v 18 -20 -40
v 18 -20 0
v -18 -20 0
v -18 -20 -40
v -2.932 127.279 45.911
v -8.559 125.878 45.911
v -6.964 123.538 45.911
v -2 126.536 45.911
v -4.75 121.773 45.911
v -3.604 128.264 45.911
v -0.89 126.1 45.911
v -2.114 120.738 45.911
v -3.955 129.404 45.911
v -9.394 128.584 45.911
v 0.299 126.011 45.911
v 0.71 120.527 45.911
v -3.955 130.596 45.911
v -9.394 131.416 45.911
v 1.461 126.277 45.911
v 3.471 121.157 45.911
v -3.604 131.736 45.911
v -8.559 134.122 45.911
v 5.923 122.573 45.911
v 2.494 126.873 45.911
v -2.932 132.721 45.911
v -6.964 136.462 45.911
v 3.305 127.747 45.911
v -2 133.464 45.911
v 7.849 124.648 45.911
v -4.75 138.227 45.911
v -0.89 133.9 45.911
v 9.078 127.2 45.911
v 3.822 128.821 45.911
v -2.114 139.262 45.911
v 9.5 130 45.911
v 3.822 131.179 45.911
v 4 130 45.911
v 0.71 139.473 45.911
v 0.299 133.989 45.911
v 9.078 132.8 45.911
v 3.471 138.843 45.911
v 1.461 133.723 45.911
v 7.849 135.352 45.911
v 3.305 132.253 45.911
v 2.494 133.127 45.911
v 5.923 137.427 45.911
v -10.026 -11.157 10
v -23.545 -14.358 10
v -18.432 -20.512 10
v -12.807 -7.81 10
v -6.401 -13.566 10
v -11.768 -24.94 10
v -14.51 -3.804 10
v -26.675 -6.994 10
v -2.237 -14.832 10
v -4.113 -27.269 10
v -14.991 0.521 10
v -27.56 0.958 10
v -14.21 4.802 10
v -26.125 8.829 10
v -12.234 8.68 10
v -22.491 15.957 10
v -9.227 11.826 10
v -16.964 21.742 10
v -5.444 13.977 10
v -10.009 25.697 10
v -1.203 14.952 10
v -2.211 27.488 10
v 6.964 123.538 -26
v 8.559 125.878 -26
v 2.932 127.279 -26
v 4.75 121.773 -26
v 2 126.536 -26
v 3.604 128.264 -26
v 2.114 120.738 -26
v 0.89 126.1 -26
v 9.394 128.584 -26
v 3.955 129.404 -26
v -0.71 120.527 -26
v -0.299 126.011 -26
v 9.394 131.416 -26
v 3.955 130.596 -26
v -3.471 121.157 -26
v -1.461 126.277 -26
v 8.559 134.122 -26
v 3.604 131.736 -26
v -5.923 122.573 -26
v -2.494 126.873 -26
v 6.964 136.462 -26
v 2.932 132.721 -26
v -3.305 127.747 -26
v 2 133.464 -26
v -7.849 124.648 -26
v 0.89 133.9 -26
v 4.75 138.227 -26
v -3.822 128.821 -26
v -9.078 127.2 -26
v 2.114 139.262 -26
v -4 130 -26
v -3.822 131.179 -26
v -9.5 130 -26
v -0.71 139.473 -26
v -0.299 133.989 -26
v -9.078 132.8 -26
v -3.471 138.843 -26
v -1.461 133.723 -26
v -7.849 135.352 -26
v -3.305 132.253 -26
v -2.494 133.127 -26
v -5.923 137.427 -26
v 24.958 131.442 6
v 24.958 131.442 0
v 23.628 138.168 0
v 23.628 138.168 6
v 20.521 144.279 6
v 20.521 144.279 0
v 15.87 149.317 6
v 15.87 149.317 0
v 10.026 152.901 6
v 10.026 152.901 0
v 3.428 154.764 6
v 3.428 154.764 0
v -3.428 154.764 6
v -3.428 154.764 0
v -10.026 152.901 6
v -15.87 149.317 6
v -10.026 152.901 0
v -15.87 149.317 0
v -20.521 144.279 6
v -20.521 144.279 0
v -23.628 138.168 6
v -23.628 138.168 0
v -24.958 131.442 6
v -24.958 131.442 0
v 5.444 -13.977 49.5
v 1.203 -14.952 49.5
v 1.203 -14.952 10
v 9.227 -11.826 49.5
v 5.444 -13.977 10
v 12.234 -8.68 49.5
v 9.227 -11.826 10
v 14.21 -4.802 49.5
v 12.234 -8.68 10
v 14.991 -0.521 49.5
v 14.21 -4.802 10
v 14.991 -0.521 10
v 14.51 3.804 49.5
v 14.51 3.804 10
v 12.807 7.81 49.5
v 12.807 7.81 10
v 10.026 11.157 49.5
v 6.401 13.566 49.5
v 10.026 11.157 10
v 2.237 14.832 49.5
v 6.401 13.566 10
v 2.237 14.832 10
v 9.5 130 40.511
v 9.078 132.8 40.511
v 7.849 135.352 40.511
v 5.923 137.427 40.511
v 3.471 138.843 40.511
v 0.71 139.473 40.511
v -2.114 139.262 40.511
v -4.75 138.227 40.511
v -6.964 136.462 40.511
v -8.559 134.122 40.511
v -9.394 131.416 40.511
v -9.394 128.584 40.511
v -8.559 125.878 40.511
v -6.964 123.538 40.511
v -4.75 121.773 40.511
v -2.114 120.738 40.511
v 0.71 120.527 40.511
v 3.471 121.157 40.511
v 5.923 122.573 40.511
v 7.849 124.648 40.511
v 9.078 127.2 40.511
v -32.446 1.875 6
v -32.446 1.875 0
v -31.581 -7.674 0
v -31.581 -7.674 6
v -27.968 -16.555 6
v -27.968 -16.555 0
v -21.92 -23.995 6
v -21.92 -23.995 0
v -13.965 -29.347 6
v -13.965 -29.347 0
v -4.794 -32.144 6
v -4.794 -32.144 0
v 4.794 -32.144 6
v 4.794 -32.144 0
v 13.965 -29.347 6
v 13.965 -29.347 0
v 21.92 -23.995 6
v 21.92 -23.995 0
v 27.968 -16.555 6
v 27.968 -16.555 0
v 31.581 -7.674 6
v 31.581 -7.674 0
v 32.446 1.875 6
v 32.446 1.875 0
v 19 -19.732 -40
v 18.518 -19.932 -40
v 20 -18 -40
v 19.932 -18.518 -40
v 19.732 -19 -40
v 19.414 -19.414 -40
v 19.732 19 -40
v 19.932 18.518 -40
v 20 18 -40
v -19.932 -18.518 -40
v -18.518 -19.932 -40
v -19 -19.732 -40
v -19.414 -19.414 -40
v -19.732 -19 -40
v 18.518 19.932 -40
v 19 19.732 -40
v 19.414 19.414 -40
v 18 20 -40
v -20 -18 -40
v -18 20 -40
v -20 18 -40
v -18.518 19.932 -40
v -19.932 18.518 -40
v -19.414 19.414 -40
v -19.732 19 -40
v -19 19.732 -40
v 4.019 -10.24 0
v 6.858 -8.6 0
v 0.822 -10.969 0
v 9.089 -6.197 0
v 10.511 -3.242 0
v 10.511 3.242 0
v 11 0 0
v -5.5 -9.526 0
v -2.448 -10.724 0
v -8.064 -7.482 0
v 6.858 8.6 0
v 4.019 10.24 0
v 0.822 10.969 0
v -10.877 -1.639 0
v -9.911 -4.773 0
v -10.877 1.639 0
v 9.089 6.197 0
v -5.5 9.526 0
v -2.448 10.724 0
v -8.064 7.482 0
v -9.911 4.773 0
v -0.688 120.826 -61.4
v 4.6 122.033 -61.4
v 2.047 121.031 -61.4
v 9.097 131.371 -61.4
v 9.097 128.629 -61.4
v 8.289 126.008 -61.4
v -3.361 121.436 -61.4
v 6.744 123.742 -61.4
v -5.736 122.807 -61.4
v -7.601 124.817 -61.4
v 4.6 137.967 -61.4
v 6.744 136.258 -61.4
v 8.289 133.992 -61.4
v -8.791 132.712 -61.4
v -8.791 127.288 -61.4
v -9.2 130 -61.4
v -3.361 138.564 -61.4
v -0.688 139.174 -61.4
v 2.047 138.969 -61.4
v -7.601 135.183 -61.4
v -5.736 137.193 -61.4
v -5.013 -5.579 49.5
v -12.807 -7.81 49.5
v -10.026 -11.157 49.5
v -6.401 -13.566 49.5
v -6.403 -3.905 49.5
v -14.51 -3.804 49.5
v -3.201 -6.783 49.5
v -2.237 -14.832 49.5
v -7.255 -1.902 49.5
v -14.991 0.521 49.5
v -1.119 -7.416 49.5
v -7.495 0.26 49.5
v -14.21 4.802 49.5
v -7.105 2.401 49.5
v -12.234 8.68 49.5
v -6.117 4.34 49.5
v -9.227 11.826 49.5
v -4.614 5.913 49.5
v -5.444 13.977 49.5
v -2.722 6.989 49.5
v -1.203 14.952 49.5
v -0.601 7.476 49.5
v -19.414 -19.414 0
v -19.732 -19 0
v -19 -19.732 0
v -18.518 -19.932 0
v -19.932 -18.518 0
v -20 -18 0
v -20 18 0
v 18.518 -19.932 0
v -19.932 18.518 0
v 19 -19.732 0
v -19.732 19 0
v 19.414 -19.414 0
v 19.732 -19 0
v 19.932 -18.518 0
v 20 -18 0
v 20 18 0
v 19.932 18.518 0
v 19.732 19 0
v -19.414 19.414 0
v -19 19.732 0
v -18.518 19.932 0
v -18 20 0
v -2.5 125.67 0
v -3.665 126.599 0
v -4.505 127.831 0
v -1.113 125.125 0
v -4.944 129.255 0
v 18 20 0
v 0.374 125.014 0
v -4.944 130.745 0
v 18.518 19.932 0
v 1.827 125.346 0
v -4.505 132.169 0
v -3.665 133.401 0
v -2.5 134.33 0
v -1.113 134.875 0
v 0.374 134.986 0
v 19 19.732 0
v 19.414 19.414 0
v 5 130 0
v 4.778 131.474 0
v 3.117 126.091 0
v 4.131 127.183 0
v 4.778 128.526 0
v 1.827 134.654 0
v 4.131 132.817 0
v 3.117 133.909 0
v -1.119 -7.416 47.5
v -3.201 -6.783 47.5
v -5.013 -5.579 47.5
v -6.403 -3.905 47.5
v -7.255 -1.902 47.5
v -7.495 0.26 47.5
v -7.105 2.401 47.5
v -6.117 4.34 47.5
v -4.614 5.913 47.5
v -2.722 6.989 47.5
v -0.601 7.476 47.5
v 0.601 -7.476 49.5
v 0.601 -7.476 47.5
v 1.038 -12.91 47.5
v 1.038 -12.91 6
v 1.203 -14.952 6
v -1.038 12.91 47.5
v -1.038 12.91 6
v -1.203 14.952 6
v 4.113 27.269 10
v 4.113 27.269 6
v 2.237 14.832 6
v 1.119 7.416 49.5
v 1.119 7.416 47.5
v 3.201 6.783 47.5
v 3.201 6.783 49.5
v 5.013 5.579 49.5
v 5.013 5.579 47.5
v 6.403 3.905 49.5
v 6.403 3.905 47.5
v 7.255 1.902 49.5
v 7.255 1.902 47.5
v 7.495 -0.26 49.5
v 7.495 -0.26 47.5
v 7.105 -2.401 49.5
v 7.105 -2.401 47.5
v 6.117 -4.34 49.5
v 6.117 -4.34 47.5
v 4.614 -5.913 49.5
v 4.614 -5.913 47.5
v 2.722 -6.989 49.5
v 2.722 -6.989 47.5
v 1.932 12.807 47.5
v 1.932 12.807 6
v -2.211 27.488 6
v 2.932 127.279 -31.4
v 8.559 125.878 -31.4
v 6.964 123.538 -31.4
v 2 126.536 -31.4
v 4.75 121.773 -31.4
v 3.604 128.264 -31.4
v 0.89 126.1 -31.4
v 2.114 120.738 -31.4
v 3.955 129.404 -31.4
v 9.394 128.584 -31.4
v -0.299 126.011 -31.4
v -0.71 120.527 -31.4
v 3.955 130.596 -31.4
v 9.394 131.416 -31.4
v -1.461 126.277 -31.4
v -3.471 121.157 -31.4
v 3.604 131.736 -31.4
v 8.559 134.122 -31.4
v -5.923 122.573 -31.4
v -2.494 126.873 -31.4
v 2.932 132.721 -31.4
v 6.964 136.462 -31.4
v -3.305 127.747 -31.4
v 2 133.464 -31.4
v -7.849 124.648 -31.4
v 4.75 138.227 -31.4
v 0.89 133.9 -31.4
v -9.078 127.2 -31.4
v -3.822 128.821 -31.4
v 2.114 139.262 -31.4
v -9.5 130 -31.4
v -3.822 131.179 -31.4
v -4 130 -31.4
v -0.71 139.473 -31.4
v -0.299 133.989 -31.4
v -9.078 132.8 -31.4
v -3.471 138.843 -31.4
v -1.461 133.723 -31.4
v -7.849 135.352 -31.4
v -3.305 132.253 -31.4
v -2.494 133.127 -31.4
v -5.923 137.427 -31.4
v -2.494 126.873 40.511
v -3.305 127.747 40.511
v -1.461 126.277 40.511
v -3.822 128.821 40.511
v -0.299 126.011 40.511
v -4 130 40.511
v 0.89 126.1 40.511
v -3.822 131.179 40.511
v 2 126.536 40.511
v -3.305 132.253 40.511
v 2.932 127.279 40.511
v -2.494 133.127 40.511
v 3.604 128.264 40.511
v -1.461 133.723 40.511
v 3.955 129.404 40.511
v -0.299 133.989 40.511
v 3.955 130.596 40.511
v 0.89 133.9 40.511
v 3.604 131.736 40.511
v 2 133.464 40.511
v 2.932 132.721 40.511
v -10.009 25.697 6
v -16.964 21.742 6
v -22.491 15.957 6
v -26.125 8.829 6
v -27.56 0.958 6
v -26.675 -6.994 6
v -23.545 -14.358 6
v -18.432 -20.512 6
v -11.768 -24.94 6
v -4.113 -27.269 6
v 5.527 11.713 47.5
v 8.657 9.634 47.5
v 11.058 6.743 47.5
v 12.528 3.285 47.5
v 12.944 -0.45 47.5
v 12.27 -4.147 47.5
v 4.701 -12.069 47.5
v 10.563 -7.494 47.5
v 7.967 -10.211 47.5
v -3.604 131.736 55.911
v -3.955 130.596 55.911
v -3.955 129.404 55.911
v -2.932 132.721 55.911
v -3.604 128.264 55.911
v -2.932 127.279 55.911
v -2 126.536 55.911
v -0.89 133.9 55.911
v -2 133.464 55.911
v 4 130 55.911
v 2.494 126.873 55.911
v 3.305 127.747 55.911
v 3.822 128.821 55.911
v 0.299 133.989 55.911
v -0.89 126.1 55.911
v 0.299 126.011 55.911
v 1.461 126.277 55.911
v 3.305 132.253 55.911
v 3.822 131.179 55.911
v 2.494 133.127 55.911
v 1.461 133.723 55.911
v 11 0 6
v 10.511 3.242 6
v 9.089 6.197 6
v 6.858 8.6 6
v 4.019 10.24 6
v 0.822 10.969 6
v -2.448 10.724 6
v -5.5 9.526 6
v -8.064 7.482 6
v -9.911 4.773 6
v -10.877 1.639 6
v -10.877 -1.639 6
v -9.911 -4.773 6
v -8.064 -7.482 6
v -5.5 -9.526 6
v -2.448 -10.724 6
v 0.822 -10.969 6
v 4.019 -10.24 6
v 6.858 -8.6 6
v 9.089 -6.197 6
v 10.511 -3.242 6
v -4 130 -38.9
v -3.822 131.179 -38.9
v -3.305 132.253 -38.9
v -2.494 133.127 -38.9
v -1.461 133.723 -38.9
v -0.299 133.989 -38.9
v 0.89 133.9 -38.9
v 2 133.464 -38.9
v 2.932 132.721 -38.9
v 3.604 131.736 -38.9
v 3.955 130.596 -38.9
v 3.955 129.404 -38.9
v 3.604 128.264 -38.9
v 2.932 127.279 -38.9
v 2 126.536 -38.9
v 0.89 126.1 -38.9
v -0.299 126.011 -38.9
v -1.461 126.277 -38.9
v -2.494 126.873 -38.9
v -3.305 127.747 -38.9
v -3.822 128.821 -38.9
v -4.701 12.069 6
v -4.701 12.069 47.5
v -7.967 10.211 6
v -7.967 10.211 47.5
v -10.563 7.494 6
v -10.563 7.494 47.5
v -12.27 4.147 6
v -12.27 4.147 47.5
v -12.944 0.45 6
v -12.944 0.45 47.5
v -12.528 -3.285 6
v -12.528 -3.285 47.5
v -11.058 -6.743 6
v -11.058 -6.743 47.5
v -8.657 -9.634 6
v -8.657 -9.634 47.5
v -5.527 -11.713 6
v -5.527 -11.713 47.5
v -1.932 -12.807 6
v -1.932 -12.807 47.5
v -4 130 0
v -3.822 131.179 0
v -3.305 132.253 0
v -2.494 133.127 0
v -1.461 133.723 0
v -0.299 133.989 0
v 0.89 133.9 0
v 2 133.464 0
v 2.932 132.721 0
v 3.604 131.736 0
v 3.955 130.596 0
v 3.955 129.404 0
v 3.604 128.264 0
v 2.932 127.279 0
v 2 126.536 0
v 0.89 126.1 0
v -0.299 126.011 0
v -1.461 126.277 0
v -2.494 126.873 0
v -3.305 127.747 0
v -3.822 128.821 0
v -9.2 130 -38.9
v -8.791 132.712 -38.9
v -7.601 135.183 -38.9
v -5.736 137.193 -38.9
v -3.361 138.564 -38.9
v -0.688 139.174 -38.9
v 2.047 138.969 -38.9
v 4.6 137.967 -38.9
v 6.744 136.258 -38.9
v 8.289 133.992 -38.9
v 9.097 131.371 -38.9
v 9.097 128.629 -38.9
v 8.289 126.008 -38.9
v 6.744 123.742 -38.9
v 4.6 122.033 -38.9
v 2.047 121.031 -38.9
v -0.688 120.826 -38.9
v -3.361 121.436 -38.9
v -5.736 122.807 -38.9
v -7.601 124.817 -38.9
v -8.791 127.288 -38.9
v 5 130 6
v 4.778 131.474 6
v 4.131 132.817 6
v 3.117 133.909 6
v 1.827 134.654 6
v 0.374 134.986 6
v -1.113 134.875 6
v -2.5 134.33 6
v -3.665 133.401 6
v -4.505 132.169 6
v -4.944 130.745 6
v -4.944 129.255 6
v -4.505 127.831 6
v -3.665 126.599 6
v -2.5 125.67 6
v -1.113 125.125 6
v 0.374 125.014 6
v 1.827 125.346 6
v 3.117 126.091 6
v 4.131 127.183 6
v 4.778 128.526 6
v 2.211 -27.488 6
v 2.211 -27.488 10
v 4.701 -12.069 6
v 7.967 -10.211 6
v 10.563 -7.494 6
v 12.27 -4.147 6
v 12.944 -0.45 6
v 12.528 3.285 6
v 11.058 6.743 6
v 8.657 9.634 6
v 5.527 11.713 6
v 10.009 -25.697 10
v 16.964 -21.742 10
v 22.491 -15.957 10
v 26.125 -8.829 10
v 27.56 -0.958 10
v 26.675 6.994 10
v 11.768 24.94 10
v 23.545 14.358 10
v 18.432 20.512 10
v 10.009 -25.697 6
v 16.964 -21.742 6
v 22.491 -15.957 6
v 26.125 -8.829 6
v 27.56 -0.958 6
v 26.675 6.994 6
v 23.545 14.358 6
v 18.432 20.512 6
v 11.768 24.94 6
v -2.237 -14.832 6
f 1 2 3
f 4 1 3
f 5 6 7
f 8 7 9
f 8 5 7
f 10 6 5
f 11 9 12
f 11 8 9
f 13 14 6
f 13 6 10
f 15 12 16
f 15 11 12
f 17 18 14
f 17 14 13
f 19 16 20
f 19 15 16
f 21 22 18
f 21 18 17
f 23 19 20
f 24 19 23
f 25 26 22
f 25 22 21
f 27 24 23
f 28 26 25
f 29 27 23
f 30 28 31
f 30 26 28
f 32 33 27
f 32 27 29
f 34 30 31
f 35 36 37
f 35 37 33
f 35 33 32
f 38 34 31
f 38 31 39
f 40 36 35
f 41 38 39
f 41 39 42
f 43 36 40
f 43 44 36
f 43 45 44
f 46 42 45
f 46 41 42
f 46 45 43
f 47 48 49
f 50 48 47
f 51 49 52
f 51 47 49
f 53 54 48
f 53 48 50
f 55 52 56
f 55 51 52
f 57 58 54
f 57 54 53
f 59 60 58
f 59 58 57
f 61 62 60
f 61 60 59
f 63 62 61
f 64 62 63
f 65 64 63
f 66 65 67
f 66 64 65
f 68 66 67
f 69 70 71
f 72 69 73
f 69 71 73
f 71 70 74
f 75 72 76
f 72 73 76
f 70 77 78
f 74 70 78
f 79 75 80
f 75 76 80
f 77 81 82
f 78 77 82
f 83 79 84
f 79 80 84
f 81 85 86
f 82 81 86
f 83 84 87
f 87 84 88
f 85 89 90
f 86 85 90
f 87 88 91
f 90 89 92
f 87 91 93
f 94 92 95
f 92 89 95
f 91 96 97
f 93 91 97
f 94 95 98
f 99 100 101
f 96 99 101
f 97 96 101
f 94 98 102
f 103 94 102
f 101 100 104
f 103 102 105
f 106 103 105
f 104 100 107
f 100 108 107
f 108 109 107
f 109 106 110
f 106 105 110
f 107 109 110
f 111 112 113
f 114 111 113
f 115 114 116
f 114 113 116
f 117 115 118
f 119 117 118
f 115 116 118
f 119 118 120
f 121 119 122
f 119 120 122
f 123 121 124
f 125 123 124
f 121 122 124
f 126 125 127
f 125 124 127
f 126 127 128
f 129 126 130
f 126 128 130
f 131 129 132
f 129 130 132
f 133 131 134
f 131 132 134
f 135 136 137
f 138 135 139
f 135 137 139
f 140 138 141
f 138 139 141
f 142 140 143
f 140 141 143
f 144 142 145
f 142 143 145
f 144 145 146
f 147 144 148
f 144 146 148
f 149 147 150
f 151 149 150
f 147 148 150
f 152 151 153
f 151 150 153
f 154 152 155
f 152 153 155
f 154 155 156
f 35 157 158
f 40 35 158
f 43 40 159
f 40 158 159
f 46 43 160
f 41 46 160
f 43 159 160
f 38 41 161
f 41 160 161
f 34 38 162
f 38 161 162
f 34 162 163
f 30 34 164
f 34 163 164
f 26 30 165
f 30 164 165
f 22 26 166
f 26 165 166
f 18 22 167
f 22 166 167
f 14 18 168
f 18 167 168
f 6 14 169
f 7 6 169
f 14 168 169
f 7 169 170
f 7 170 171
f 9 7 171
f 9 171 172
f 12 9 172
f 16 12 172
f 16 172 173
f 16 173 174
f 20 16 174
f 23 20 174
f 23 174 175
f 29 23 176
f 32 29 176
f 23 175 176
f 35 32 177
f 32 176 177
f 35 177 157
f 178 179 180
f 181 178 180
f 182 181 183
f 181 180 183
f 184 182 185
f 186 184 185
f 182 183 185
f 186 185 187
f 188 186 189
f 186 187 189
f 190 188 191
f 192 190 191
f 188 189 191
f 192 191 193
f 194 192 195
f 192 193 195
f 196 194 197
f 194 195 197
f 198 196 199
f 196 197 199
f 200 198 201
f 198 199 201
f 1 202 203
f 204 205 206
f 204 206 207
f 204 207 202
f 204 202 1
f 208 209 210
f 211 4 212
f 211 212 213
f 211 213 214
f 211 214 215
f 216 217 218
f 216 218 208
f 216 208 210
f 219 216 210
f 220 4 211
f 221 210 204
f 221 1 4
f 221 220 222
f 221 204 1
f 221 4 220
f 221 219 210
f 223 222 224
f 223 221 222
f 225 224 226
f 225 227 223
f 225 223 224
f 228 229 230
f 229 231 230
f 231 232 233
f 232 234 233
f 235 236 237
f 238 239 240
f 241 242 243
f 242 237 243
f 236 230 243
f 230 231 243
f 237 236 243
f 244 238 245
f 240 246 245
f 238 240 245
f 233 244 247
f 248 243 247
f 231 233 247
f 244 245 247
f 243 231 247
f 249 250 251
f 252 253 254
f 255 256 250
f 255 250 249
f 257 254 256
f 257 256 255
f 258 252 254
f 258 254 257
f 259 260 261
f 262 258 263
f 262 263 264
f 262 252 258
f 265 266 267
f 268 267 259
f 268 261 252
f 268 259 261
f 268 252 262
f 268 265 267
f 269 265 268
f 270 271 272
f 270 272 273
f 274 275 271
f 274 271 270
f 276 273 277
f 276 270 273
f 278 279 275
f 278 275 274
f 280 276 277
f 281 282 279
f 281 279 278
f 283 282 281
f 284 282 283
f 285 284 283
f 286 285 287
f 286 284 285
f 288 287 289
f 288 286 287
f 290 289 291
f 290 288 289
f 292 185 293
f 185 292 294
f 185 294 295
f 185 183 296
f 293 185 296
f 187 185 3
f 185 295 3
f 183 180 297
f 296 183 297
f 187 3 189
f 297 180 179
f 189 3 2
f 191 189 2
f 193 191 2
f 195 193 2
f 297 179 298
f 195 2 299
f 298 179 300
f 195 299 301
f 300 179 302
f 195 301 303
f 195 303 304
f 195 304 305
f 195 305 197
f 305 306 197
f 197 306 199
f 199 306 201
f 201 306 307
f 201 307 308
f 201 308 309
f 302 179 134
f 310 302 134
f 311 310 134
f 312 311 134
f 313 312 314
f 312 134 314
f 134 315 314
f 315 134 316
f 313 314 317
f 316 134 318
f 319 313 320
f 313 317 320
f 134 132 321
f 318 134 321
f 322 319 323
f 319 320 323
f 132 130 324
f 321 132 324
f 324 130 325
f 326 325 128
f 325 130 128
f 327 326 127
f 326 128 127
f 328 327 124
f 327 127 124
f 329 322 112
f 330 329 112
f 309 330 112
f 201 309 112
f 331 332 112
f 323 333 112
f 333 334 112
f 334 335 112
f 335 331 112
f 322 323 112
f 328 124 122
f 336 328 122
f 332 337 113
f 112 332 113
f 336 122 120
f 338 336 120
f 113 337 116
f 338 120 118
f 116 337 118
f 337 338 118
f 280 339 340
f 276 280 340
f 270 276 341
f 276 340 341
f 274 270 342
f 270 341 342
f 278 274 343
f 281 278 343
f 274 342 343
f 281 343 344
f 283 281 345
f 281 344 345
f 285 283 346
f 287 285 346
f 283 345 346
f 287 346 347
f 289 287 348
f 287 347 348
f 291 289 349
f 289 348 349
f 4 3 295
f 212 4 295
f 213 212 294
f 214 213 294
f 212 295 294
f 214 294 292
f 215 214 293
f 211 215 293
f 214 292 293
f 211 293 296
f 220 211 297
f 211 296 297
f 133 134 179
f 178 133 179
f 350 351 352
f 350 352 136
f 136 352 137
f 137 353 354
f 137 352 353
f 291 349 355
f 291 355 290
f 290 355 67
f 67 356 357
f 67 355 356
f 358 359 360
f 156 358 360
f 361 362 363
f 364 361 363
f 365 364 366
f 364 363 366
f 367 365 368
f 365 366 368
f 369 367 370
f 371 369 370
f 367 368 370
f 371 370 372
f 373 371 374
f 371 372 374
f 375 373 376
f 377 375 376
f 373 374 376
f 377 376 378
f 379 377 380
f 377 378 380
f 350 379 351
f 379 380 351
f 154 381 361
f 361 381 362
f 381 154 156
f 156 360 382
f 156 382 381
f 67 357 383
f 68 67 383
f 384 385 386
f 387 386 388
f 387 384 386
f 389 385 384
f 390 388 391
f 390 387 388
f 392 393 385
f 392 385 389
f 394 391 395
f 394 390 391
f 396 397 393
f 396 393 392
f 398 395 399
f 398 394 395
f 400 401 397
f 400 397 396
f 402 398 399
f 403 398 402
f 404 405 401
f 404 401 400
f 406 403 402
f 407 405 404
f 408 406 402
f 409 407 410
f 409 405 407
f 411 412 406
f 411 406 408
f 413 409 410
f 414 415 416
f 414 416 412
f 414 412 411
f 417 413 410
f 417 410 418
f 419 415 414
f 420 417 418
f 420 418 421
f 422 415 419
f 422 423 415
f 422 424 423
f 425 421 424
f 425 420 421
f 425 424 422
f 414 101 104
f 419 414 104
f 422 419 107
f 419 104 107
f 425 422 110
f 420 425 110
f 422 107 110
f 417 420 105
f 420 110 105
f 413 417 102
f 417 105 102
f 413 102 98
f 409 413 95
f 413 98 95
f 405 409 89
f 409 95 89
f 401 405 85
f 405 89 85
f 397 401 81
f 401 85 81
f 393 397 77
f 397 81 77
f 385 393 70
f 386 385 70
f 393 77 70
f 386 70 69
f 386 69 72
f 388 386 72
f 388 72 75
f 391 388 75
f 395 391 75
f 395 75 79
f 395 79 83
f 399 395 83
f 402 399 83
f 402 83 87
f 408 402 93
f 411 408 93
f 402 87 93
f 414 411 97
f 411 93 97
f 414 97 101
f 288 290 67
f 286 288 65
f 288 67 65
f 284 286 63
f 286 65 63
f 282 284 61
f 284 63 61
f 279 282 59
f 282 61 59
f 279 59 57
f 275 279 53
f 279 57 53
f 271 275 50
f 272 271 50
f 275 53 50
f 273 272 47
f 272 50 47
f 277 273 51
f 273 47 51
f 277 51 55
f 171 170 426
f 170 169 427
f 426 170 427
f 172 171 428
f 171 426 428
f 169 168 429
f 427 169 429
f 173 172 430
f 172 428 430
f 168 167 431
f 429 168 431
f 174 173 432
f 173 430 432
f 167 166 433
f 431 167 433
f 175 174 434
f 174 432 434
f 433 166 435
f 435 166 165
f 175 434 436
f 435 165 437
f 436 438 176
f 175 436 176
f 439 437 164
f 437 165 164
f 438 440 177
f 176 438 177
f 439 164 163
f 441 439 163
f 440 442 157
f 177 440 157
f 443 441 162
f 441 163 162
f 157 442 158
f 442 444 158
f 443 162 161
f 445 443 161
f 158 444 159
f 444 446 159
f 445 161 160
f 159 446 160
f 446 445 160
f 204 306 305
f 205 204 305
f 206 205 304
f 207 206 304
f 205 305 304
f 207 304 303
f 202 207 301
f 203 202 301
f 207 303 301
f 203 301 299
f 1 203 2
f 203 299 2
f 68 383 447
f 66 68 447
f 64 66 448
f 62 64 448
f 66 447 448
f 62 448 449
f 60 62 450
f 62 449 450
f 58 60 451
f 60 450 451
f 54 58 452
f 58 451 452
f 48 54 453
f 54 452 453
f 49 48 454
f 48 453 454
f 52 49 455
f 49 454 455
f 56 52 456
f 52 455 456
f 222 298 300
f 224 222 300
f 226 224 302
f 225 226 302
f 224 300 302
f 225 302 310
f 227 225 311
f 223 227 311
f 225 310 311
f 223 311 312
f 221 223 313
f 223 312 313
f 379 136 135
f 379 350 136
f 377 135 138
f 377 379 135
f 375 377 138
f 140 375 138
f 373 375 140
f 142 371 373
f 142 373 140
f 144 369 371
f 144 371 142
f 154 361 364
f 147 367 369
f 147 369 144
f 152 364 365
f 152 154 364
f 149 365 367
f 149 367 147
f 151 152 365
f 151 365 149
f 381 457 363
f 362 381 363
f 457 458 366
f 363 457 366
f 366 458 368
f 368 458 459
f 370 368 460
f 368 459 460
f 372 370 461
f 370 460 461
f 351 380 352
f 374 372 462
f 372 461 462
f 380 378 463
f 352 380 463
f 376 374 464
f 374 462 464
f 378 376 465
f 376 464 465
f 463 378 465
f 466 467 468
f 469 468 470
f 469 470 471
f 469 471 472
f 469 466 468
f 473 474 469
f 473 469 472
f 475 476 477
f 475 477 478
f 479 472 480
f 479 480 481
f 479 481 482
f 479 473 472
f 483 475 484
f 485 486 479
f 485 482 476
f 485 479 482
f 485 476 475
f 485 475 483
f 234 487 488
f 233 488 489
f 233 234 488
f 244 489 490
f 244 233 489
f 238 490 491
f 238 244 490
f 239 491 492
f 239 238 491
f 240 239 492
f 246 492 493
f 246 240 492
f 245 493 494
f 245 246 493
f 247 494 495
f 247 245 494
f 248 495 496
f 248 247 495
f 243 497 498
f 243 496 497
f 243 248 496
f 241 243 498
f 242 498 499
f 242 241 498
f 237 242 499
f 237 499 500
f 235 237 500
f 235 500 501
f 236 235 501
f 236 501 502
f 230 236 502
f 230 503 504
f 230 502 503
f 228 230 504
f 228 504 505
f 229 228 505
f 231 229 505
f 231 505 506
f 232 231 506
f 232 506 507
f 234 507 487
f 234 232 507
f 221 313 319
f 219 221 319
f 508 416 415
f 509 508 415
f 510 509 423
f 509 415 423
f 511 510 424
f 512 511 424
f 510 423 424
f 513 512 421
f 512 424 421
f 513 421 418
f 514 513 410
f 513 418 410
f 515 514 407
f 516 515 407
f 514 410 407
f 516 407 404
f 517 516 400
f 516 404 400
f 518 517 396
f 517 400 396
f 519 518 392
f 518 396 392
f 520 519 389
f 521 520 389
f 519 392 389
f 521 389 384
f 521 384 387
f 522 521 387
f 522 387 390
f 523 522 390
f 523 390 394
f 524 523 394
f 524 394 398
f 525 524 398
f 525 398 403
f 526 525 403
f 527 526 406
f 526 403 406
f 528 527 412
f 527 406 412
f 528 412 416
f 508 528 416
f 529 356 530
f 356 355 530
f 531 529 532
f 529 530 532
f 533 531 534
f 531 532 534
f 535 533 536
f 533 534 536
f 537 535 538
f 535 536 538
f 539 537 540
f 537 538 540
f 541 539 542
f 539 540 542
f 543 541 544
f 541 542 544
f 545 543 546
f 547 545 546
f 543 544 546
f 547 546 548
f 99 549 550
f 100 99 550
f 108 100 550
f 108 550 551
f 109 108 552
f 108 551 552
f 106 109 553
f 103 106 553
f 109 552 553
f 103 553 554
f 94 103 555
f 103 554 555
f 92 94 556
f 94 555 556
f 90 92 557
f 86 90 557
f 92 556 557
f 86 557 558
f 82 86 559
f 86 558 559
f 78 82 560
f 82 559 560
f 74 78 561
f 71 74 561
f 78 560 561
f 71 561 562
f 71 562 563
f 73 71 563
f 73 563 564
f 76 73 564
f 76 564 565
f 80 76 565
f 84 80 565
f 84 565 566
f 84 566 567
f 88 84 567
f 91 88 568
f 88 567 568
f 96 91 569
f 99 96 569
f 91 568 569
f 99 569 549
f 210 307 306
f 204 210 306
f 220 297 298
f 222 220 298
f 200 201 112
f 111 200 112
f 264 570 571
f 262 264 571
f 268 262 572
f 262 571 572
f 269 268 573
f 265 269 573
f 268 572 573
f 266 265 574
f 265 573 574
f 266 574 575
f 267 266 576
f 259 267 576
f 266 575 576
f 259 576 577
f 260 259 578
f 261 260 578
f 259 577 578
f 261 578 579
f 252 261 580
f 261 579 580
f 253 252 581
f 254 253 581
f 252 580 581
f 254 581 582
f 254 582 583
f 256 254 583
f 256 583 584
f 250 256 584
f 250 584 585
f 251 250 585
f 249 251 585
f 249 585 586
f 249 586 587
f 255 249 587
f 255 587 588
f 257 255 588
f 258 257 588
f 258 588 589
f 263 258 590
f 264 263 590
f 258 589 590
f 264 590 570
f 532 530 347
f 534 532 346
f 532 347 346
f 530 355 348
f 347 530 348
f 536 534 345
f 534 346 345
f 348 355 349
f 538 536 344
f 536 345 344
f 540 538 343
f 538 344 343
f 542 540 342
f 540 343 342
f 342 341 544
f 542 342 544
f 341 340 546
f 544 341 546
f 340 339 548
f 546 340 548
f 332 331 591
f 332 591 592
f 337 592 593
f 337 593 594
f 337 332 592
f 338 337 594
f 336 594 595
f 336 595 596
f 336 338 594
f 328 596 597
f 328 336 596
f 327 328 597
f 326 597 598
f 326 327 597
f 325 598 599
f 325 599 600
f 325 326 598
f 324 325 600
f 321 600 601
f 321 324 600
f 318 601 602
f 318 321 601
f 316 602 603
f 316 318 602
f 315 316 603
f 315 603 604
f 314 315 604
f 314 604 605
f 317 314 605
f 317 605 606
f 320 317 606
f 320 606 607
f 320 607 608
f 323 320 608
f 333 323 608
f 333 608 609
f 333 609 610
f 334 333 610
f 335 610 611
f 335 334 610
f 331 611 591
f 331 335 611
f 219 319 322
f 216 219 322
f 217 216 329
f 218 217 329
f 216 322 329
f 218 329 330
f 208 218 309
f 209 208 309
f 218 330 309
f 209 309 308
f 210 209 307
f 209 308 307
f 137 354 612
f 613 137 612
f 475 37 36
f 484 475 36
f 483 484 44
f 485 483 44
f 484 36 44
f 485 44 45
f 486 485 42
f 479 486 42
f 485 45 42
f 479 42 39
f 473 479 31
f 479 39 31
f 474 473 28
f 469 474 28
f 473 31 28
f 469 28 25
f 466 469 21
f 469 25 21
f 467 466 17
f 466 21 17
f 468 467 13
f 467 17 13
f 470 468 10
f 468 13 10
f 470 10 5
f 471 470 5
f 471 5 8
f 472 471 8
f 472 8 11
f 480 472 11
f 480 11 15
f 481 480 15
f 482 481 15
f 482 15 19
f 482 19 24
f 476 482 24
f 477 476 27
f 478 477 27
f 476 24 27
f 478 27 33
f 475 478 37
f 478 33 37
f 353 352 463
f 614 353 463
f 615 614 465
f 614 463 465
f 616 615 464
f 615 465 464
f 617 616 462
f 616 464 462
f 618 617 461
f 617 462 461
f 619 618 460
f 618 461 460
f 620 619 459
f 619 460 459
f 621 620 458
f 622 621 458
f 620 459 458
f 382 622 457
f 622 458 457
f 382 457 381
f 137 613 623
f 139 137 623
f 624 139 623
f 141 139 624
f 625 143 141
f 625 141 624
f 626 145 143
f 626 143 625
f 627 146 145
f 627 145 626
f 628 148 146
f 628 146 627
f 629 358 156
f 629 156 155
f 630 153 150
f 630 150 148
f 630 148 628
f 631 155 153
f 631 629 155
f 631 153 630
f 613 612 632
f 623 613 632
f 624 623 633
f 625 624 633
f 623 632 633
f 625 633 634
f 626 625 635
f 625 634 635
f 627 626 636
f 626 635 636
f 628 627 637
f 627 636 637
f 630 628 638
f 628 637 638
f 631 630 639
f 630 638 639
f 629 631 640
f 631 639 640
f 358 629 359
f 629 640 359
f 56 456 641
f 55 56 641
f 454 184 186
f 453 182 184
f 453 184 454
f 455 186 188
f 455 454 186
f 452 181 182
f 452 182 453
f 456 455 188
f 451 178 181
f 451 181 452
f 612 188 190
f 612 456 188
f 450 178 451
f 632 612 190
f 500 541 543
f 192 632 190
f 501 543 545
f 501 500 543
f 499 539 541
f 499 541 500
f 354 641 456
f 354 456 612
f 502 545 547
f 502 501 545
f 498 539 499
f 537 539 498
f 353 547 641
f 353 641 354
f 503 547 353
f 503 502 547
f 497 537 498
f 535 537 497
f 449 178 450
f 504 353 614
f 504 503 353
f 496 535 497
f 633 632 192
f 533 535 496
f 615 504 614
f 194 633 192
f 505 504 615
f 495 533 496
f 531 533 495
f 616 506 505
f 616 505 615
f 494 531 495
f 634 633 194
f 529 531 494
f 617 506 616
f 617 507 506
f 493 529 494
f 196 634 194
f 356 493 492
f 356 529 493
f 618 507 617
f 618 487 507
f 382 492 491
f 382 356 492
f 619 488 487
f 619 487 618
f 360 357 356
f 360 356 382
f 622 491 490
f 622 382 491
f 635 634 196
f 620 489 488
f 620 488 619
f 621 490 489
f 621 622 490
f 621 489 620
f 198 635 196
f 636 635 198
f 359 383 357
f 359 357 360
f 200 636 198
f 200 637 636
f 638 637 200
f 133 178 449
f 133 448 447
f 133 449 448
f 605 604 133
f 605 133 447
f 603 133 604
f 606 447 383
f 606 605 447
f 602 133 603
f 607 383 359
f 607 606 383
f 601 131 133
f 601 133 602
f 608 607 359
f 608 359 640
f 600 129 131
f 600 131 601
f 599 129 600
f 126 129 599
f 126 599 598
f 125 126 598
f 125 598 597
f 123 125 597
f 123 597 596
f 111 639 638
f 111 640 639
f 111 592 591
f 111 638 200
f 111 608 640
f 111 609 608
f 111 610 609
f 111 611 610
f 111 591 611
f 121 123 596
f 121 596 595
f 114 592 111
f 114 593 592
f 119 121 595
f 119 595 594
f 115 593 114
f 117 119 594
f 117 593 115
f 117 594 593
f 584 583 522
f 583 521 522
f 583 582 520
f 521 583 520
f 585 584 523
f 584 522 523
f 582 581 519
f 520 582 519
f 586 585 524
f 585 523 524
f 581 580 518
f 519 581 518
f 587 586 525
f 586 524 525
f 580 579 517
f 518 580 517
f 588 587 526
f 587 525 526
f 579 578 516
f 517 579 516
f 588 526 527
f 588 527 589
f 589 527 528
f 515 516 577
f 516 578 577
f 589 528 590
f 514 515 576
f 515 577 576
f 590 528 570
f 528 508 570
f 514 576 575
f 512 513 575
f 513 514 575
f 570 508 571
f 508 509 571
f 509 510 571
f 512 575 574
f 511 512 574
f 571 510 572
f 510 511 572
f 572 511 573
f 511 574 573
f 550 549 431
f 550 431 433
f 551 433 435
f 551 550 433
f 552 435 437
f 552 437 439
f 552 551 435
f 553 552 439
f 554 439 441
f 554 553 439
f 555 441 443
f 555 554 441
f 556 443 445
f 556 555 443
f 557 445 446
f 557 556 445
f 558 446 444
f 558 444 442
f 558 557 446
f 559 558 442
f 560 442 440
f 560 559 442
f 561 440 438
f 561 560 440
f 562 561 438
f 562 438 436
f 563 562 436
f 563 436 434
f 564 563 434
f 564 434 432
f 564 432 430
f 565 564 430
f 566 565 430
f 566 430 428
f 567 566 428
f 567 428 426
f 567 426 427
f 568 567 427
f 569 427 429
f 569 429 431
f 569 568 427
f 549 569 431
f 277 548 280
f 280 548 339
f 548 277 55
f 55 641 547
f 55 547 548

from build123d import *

# Parameters (mm, degrees)
SKETCH1_R            = 5
SKETCH1_R_2          = 11
BOSS_EXTRUDE1_DEPTH  = 6
BOSS_EXTRUDE2_DEPTH  = 40
BOSS_EXTRUDE4_DEPTH  = 4
BOSS_EXTRUDE5_DEPTH  = 43.5
SKETCH3_R            = 4
BOSS_EXTRUDE6_DEPTH  = 40.511
SKETCH4_R            = 9.5
BOSS_EXTRUDE7_DEPTH  = 5.4
SKETCH5_R            = 4
BOSS_EXTRUDE8_DEPTH  = 10
SKETCH3_2_R          = 4
BOSS_EXTRUDE9_DEPTH  = 26
SKETCH6_R            = 9.5
BOSS_EXTRUDE10_DEPTH = 5.4
SKETCH7_R            = 4
BOSS_EXTRUDE12_DEPTH = 7.5
SKETCH8_R            = 9.2
BOSS_EXTRUDE13_DEPTH = 22.5


with BuildPart() as part:
    # Sketch1 → Boss-Extrude1 (new body)
    with BuildSketch(Plane.XY):
        with BuildLine():
            Line((32.445868381, 1.875), (24.958360293, 131.442307692))
            ThreePointArc((24.958360293, 131.442307692), (0, 155), (-24.958360293, 131.442307692))
            Line((-24.958360293, 131.442307692), (-32.445868381, 1.875))
            ThreePointArc((-32.445868381, 1.875), (0, -32.5), (32.445868381, 1.875))
        make_face()
        with Locations((0, 130)):
            Circle(SKETCH1_R, mode=Mode.SUBTRACT)
        Circle(SKETCH1_R_2, mode=Mode.SUBTRACT)
    extrude(amount=BOSS_EXTRUDE1_DEPTH)

    # Sketch1<3> → Boss-Extrude2 (add)
    with BuildSketch(Plane.XY):
        with BuildLine():
            ThreePointArc((-18, 20), (-19.414213562, 19.414213562), (-20, 18))
            Line((-20, 18), (-20, -18))
            ThreePointArc((-20, -18), (-19.414213562, -19.414213562), (-18, -20))
            Line((-18, -20), (18, -20))
            ThreePointArc((18, -20), (19.414213562, -19.414213562), (20, -18))
            Line((20, -18), (20, 18))
            ThreePointArc((20, 18), (19.414213562, 19.414213562), (18, 20))
            Line((18, 20), (-18, 20))
        make_face()
    extrude(amount=-BOSS_EXTRUDE2_DEPTH)

    # Sketch2 → Boss-Extrude4 (add)
    with BuildSketch(Plane.XY.offset(6)):
        with BuildLine():
            ThreePointArc((2.210858166, -27.488234486), (27.560369933, -0.957568872), (4.113348883, 27.268503625))
            Line((4.113348883, 27.268503625), (2.237380181, 14.832199093))
            ThreePointArc((2.237380181, 14.832199093), (14.990954382, -0.520851908), (1.202555481, -14.951717638))
            Line((1.202555481, -14.951717638), (2.210858166, -27.488234486))
        make_face()
        with BuildLine():
            Line((-1.202555481, 14.951717638), (-2.210858166, 27.488234486))
            ThreePointArc((-2.210858166, 27.488234486), (-27.560369933, 0.957568872), (-4.113348883, -27.268503625))
            Line((-4.113348883, -27.268503625), (-2.237380181, -14.832199093))
            ThreePointArc((-2.237380181, -14.832199093), (-14.990954382, 0.520851908), (-1.202555481, 14.951717638))
        make_face()
    extrude(amount=BOSS_EXTRUDE4_DEPTH)

    # Sketch2<3> → Boss-Extrude5 (add)
    with BuildSketch(Plane.XY.offset(6)):
        with BuildLine():
            Line((2.237380181, 14.832199093), (1.11869009, 7.416099546))
            ThreePointArc((1.11869009, 7.416099546), (7.495477191, -0.260425954), (0.60127774, -7.475858819))
            Line((0.60127774, -7.475858819), (1.202555481, -14.951717638))
            ThreePointArc((1.202555481, -14.951717638), (14.990954382, -0.520851908), (2.237380181, 14.832199093))
        make_face()
        with BuildLine():
            ThreePointArc((-1.202555481, 14.951717638), (-14.990954382, 0.520851908), (-2.237380181, -14.832199093))
            Line((-2.237380181, -14.832199093), (-1.11869009, -7.416099546))
            ThreePointArc((-1.11869009, -7.416099546), (-7.495477191, 0.260425954), (-0.60127774, 7.475858819))
            Line((-0.60127774, 7.475858819), (-1.202555481, 14.951717638))
        make_face()
    extrude(amount=BOSS_EXTRUDE5_DEPTH)

    # Sketch9 → Cut-Revolve1 (revolve, cut)
    with BuildSketch(Plane.ZY):
        Polygon((6, -7.475858819), (6, -10.964592934), (6, -12.951717638), (47.5, -12.951717638), (47.5, -7.475858819), align=None)
    revolve(axis=Axis((0, 0, 3.424764537), (0, 0, 1)), mode=Mode.SUBTRACT)


with BuildPart() as body_2:
    # Sketch3 → Boss-Extrude6 (new body)
    with BuildSketch(Plane(origin=(0, 0, 0), x_dir=(-1, 0, 0), z_dir=(0, 0, -1))):
        with Locations((0, 130)):
            Circle(SKETCH3_R)
    extrude(amount=-BOSS_EXTRUDE6_DEPTH)

    # Sketch4 → Boss-Extrude7 (add)
    with BuildSketch(Plane.XY.offset(40.511)):
        with Locations((0, 130)):
            Circle(SKETCH4_R)
    extrude(amount=BOSS_EXTRUDE7_DEPTH)

    # Sketch5 → Boss-Extrude8 (add)
    with BuildSketch(Plane.XY.offset(45.911)):
        with Locations((0, 130)):
            Circle(SKETCH5_R)
    extrude(amount=BOSS_EXTRUDE8_DEPTH)

    # Sketch3<2> → Boss-Extrude9 (add)
    with BuildSketch(Plane(origin=(0, 0, 0), x_dir=(-1, 0, 0), z_dir=(0, 0, -1))):
        with Locations((0, 130)):
            Circle(SKETCH3_2_R)
    extrude(amount=BOSS_EXTRUDE9_DEPTH)

    # Sketch6 → Boss-Extrude10 (add)
    with BuildSketch(Plane(origin=(0, 0, -26), x_dir=(-1, 0, 0), z_dir=(0, 0, -1))):
        with Locations((0, 130)):
            Circle(SKETCH6_R)
    extrude(amount=BOSS_EXTRUDE10_DEPTH)

    # Sketch7 → Boss-Extrude12 (add)
    with BuildSketch(Plane(origin=(0, 0, -31.4), x_dir=(-1, 0, 0), z_dir=(0, 0, -1))):
        with Locations((0, 130)):
            Circle(SKETCH7_R)
    extrude(amount=BOSS_EXTRUDE12_DEPTH)

    # Sketch8 → Boss-Extrude13 (add)
    with BuildSketch(Plane(origin=(0, 0, -38.9), x_dir=(-1, 0, 0), z_dir=(0, 0, -1))):
        with Locations((0, 130)):
            Circle(SKETCH8_R)
    extrude(amount=BOSS_EXTRUDE13_DEPTH)


solid = Compound([part.part, body_2.part])
